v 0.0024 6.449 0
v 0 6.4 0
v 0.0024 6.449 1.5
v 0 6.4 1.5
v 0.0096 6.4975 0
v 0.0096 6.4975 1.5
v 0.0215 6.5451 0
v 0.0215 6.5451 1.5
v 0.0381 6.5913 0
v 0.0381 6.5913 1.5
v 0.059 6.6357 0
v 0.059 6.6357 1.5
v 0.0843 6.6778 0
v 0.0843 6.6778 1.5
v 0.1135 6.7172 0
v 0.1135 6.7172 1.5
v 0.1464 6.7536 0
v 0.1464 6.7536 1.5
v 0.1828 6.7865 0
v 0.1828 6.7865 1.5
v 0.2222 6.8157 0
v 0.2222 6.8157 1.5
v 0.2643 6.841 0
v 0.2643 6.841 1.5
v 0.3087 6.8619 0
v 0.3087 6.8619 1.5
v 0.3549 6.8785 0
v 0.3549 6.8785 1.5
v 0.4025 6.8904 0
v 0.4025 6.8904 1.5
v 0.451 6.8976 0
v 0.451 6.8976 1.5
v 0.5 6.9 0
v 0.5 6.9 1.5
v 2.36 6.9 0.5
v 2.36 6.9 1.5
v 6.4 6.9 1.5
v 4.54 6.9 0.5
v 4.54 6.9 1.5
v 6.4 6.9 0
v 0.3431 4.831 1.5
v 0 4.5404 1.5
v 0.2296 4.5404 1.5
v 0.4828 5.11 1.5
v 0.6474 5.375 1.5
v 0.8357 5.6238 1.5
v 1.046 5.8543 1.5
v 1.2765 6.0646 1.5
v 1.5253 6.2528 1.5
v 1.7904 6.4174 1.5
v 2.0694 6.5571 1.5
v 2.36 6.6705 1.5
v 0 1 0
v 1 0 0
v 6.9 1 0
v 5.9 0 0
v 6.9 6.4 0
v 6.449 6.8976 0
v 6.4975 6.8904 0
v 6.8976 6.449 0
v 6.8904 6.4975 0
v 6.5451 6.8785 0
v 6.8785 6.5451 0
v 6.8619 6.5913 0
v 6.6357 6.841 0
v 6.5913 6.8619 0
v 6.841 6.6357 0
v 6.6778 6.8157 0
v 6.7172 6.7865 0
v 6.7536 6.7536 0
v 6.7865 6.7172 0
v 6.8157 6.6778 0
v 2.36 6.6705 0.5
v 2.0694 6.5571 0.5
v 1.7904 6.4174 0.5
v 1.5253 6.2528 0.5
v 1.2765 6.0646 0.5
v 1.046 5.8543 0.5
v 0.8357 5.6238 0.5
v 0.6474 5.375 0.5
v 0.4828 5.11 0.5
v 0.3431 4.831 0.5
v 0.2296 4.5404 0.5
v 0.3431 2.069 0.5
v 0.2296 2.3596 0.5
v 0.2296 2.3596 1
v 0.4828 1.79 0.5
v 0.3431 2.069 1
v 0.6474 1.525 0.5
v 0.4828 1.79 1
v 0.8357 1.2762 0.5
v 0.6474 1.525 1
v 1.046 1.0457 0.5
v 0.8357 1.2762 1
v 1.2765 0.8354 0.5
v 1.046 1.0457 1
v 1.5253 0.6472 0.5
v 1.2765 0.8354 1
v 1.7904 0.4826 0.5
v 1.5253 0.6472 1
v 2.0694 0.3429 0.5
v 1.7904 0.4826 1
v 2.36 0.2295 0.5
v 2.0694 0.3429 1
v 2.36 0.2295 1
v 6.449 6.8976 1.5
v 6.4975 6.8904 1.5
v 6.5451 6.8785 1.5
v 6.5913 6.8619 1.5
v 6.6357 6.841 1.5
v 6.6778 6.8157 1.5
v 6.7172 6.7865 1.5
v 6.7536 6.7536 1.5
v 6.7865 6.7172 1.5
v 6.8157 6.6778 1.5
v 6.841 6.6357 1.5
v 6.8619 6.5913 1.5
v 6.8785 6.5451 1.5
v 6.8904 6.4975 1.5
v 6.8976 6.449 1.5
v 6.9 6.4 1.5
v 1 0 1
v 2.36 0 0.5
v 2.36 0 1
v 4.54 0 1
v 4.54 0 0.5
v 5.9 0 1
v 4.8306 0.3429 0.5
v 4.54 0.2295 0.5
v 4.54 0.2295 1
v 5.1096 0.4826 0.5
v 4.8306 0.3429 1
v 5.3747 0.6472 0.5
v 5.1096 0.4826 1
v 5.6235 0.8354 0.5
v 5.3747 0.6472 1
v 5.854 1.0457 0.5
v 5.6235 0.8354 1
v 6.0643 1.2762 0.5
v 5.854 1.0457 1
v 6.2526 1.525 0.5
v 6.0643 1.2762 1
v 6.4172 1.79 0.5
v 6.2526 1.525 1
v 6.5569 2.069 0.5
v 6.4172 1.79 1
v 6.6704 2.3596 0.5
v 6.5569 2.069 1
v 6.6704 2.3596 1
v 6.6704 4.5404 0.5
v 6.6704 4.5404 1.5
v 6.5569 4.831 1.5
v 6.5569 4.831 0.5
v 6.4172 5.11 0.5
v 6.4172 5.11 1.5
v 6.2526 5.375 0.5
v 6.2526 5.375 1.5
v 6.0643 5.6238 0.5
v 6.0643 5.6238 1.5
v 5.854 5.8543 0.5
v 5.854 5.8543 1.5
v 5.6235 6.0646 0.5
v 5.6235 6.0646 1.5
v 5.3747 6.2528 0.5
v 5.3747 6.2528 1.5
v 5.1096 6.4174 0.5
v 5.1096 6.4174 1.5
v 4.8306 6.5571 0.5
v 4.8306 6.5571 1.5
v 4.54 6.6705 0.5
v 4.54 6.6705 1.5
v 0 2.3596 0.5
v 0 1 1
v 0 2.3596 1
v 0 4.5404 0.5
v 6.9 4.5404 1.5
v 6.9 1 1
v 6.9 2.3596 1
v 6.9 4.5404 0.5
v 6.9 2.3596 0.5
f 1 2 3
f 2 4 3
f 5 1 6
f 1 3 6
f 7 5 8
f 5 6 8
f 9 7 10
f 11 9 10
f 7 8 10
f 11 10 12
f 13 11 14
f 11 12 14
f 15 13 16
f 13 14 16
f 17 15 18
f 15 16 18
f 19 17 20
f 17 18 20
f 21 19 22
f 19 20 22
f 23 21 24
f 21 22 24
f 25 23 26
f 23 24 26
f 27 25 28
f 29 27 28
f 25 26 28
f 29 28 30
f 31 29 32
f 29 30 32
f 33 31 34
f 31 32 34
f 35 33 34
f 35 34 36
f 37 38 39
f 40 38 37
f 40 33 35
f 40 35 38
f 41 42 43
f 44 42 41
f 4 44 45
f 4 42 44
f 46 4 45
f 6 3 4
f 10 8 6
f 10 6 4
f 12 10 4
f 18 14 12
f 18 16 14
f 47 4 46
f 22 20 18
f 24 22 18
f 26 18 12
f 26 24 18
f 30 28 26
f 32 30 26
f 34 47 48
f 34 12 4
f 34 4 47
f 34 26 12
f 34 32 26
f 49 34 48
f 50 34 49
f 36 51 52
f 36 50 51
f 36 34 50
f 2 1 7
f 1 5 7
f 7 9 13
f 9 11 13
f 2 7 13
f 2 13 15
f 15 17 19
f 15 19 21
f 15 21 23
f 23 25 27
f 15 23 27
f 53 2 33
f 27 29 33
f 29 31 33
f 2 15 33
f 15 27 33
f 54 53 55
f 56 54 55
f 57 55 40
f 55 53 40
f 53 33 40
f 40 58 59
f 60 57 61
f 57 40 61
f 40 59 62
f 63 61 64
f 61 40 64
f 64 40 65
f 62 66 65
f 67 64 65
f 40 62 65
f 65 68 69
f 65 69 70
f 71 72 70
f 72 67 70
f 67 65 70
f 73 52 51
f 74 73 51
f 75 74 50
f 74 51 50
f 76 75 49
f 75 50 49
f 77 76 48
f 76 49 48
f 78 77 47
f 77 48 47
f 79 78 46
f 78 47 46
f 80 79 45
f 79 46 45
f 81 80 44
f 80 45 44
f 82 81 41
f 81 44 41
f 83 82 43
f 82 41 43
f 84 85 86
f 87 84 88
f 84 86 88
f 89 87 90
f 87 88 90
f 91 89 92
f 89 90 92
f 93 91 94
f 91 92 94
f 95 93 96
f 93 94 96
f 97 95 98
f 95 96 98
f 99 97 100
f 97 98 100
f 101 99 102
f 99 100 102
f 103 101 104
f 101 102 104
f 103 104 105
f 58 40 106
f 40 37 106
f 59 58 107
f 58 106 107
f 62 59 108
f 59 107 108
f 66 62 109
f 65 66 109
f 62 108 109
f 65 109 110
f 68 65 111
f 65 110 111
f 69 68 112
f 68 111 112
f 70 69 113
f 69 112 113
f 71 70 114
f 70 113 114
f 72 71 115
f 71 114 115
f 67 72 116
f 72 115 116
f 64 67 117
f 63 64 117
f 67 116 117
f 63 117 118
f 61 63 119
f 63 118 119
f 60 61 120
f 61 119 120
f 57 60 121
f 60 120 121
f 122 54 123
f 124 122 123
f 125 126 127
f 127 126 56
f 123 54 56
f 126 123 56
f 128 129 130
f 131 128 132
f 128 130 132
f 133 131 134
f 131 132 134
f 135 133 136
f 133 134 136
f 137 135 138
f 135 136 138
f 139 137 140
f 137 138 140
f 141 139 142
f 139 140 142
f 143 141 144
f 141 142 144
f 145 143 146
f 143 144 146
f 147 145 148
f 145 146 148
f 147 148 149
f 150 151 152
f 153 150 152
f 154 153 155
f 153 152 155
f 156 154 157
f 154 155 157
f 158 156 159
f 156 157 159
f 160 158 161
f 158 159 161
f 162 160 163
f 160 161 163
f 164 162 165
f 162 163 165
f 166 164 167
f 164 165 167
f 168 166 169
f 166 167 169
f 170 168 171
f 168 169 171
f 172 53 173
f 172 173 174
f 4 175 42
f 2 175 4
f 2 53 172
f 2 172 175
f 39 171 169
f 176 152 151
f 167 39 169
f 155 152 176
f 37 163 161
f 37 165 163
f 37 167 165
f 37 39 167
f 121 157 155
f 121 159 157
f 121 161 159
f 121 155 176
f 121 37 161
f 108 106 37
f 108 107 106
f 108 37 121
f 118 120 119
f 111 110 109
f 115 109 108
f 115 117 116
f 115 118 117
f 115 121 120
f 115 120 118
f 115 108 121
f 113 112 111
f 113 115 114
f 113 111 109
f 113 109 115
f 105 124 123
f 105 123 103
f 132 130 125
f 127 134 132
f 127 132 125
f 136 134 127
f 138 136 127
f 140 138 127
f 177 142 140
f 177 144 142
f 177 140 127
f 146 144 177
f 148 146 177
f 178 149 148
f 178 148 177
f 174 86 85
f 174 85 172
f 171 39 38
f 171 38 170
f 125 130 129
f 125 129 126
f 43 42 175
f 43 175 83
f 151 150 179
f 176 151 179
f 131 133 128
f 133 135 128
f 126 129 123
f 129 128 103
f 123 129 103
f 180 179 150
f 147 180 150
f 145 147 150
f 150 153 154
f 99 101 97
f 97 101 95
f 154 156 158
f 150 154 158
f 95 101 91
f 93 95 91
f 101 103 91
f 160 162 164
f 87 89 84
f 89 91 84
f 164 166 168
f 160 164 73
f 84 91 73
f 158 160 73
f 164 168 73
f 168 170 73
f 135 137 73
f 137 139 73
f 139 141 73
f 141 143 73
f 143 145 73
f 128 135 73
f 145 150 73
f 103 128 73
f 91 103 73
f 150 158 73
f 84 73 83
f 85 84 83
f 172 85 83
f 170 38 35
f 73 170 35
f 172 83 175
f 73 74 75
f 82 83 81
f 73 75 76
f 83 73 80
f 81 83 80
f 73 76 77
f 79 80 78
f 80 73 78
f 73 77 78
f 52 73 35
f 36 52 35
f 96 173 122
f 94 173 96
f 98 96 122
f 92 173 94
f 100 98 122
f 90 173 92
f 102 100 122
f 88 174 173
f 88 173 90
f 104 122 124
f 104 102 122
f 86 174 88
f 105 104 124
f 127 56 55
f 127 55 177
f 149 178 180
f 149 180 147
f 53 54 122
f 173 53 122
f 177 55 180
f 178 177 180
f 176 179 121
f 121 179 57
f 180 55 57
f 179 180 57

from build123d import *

# Parameters (mm, degrees)
ESQUISSE1_W             = 6.9
ESQUISSE1_H             = 6.9
BOSS_EXTRU_1_DEPTH      = 1.5
ESQUISSE2_R             = 3.4
ENL_V_MAT_EXTRU_7_DEPTH = 1
ENL_V_MAT_EXTRU_8_DEPTH = 1
ESQUISSE4_W             = 6.9
ESQUISSE4_H             = 2.359638985
ENL_V_MAT_EXTRU_9_DEPTH = 0.5
CHANFREIN1_SIZE         = 1
CONG_1_R                = 0.5


with BuildPart() as part:
    # Esquisse1 → Boss.-Extru.1 (new body)
    with BuildSketch(Plane.XY):
        with Locations((3.45, 3.45)):
            Rectangle(ESQUISSE1_W, ESQUISSE1_H)
    extrude(amount=BOSS_EXTRU_1_DEPTH)

    # Esquisse2 → Enlèv. mat.-Extru.7 (cut)
    with BuildSketch(Plane.XY.offset(1.5)):
        with Locations((3.45, 3.45)):
            Circle(ESQUISSE2_R)
    extrude(amount=-ENL_V_MAT_EXTRU_7_DEPTH, mode=Mode.SUBTRACT)

    # Esquisse3 → Enlèv. mat.-Extru.8 (cut)
    with BuildSketch(Plane.XY.offset(1.5)):
        Polygon((0, 4.540361015), (2.36, 4.540361015), (2.36, 6.9), (4.54, 6.9), (4.54, 4.540361015), (6.9, 4.540361015), (6.9, 2.359638985), (4.54, 2.359638985), (4.54, 0), (2.36, 0), (2.36, 2.359638985), (0, 2.359638985), align=None)
    extrude(amount=-ENL_V_MAT_EXTRU_8_DEPTH, mode=Mode.SUBTRACT)

    # Esquisse4 → Enlèv. mat.-Extru.9 (cut)
    with BuildSketch(Plane.XY.offset(1.5)):
        with Locations((3.45, 1.179819493)):
            Rectangle(ESQUISSE4_W, ESQUISSE4_H)
    extrude(amount=-ENL_V_MAT_EXTRU_9_DEPTH, mode=Mode.SUBTRACT)

    # Chanfrein1
    chanfrein1_edges = [part.edges().sort_by_distance(p)[0] for p in [
        (6.9, 0, 0.5),
        (0, 0, 0.5),
    ]]
    chamfer(chanfrein1_edges, length=CHANFREIN1_SIZE)

    # Congé1
    cong_1_edges = [part.edges().sort_by_distance(p)[0] for p in [
        (0, 6.9, 0.75),
        (6.9, 6.9, 0.75),
    ]]
    fillet(cong_1_edges, radius=CONG_1_R)


solid = part.part
